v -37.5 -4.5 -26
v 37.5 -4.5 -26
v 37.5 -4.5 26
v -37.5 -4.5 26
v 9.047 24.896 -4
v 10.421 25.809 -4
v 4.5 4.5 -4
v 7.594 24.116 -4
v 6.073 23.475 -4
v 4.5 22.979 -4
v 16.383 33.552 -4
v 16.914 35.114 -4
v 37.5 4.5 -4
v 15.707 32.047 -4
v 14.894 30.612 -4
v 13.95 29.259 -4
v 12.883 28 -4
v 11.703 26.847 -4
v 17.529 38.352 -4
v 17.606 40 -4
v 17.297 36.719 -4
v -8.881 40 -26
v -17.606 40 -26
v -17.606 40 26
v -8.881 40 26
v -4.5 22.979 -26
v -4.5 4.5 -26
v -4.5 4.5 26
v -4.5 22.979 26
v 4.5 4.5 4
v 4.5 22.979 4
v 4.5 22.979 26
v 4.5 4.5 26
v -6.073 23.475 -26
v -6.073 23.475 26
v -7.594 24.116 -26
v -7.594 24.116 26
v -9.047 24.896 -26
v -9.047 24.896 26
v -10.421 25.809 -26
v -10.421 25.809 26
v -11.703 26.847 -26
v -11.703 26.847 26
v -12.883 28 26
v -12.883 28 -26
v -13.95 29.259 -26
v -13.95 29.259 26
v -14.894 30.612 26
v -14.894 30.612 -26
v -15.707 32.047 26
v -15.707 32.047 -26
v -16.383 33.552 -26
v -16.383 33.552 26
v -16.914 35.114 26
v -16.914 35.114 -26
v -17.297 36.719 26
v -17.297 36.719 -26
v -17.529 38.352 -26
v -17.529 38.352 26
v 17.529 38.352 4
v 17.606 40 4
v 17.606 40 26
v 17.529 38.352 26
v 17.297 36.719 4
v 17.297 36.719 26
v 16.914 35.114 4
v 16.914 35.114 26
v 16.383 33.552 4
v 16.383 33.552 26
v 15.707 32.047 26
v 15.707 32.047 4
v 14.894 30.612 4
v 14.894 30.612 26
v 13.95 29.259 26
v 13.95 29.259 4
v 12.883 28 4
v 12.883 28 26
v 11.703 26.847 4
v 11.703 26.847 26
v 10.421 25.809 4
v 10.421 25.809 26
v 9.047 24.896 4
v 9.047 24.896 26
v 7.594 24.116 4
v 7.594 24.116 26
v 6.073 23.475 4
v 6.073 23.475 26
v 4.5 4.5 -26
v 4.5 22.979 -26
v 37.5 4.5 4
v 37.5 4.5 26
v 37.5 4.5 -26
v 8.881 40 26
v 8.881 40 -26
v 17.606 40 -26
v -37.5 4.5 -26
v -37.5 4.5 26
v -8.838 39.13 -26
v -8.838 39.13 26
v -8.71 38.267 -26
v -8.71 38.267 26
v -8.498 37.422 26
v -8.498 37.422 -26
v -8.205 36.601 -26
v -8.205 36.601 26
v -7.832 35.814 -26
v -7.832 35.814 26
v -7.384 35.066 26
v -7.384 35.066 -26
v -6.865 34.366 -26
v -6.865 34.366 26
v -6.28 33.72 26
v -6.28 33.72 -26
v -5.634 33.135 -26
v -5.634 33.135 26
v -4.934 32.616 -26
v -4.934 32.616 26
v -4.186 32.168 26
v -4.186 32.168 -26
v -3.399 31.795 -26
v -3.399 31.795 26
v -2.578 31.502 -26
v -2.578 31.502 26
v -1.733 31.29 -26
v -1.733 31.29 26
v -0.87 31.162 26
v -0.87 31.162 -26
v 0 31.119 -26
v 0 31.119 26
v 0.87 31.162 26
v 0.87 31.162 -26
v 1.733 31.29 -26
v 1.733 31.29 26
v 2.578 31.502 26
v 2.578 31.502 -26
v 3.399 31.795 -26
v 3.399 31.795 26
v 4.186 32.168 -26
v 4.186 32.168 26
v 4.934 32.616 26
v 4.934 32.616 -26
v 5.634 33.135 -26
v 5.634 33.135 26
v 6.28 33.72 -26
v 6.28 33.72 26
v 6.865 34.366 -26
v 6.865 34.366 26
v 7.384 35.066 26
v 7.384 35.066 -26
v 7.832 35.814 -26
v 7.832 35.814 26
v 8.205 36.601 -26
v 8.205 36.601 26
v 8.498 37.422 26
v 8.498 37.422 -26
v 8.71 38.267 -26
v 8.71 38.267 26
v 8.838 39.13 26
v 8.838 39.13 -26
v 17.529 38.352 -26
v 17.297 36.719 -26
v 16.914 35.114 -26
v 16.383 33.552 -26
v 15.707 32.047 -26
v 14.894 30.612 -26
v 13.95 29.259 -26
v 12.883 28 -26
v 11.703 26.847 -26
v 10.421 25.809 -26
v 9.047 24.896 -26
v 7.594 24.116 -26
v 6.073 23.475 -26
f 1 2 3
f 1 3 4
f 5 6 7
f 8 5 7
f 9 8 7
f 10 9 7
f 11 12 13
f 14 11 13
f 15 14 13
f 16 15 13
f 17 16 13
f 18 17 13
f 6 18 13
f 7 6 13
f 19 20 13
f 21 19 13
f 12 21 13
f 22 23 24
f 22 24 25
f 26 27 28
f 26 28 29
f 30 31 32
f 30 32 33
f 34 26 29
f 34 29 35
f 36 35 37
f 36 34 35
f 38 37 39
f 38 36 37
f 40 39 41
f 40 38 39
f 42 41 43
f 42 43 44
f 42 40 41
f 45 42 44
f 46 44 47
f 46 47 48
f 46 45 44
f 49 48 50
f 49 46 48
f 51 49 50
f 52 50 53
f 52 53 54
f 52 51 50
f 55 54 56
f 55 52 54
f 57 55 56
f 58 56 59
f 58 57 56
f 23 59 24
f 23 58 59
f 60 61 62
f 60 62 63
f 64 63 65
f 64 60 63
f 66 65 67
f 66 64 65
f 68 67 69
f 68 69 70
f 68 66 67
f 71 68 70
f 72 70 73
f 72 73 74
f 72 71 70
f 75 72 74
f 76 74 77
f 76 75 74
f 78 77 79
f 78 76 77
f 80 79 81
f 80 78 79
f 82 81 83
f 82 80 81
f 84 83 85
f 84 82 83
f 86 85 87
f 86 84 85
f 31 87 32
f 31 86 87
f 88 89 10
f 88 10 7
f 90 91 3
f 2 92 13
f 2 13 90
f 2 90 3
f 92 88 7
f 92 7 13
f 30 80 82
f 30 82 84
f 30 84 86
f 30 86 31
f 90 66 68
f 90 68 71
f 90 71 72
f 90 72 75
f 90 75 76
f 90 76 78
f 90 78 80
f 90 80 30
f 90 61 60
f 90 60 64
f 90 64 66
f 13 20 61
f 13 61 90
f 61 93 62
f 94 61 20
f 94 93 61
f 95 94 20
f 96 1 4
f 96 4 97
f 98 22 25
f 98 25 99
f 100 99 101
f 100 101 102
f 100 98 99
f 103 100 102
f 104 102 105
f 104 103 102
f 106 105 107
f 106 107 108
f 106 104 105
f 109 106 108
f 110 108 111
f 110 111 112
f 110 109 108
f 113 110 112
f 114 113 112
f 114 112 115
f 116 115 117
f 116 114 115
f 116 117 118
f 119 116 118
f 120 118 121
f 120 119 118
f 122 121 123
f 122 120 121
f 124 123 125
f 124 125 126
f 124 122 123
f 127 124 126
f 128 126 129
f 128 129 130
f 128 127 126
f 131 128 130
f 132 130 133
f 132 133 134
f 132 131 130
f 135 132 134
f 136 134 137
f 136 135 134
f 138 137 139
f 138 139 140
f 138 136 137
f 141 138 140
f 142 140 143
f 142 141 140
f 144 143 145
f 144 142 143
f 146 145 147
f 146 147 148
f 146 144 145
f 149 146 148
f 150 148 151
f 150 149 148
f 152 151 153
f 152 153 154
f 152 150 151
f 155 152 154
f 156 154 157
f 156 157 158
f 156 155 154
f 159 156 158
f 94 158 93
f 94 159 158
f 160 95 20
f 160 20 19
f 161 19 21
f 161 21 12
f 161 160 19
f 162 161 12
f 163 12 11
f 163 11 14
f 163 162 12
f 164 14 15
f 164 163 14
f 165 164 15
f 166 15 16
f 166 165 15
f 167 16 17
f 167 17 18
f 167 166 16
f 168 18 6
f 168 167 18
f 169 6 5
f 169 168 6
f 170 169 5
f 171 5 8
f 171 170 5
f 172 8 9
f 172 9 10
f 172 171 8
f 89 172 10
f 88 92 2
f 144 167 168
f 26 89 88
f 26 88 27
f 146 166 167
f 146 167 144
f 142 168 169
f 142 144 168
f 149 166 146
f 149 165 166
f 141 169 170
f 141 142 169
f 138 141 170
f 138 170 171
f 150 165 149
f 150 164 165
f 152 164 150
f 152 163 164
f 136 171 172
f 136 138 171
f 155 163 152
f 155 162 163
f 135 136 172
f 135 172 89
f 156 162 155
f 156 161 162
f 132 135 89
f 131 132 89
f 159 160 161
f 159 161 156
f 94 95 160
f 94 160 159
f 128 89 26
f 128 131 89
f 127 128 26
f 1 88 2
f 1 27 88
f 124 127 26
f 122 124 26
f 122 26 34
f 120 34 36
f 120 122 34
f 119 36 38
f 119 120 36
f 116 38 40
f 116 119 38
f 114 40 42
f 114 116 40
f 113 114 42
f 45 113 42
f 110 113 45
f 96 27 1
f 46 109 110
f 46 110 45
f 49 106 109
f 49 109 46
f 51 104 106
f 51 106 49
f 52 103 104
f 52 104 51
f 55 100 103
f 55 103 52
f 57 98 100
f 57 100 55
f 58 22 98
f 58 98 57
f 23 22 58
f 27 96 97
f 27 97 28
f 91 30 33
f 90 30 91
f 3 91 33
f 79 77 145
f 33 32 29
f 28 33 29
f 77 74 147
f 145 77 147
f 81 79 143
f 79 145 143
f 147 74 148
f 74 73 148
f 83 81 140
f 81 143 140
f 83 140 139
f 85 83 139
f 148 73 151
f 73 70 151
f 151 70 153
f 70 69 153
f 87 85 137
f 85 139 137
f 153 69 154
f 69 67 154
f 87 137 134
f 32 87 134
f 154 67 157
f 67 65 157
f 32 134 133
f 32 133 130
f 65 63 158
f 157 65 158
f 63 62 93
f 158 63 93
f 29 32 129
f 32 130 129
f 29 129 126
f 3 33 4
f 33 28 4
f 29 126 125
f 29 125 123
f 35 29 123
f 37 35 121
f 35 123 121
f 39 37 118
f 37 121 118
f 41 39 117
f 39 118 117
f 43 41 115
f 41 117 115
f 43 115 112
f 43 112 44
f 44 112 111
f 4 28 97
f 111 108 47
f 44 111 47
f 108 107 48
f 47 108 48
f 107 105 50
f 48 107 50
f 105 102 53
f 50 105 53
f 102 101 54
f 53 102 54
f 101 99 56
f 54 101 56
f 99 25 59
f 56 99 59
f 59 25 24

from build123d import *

# Parameters (mm, degrees)
BOSS_EXTRUDE5_DEPTH      = 26
BOSS_EXTRUDE5_DEPTH_BACK = 26
RIB1_REACH               = 62.682
SKETCH8_WALL_W           = 164.057376466
SKETCH8_WALL_H           = 8


with BuildPart() as part:
    # Sketch7 → Boss-Extrude5 (new, two sides: drawn at the far end of the back side and taken through both)
    with BuildSketch(Plane.XY.offset(-BOSS_EXTRUDE5_DEPTH_BACK)):
        with BuildLine():
            Line((-17.60590988, 40), (-8.880775936, 40))
            ThreePointArc((-8.880775936, 40), (0, 31.119224064), (8.880775936, 40))
            Line((8.880775936, 40), (17.60590988, 40))
            ThreePointArc((17.60590988, 40), (13.949814643, 29.258923046), (4.5, 22.978893611))
            Line((4.5, 22.978893611), (4.5, 4.5))
            Line((4.5, 4.5), (37.5, 4.5))
            Line((37.5, 4.5), (37.5, -4.5))
            Line((37.5, -4.5), (-37.5, -4.5))
            Line((-37.5, -4.5), (-37.5, 4.5))
            Line((-37.5, 4.5), (-4.5, 4.5))
            Line((-4.5, 4.5), (-4.5, 22.978893611))
            ThreePointArc((-4.5, 22.978893611), (-13.949814643, 29.258923046), (-17.60590988, 40))
        make_face()
    extrude(amount=BOSS_EXTRUDE5_DEPTH + BOSS_EXTRUDE5_DEPTH_BACK)

    # Sketch8 wall → Rib1 (add, up to next)
    with BuildSketch(Plane(origin=(27.55295494, 22.25, 0), x_dir=(0.488866930082, -0.872358369406, 0), z_dir=(0.872358369406, 0.488866930082, 0)), mode=Mode.PRIVATE) as rib1_sk1:
        Rectangle(SKETCH8_WALL_W, SKETCH8_WALL_H)
    rib1_tool1 = extrude(rib1_sk1.sketch, amount=-RIB1_REACH, mode=Mode.PRIVATE) - part.part
    add(rib1_tool1.solids().sort_by_distance((27.55295494, 22.25, 0))[0])


solid = part.part
